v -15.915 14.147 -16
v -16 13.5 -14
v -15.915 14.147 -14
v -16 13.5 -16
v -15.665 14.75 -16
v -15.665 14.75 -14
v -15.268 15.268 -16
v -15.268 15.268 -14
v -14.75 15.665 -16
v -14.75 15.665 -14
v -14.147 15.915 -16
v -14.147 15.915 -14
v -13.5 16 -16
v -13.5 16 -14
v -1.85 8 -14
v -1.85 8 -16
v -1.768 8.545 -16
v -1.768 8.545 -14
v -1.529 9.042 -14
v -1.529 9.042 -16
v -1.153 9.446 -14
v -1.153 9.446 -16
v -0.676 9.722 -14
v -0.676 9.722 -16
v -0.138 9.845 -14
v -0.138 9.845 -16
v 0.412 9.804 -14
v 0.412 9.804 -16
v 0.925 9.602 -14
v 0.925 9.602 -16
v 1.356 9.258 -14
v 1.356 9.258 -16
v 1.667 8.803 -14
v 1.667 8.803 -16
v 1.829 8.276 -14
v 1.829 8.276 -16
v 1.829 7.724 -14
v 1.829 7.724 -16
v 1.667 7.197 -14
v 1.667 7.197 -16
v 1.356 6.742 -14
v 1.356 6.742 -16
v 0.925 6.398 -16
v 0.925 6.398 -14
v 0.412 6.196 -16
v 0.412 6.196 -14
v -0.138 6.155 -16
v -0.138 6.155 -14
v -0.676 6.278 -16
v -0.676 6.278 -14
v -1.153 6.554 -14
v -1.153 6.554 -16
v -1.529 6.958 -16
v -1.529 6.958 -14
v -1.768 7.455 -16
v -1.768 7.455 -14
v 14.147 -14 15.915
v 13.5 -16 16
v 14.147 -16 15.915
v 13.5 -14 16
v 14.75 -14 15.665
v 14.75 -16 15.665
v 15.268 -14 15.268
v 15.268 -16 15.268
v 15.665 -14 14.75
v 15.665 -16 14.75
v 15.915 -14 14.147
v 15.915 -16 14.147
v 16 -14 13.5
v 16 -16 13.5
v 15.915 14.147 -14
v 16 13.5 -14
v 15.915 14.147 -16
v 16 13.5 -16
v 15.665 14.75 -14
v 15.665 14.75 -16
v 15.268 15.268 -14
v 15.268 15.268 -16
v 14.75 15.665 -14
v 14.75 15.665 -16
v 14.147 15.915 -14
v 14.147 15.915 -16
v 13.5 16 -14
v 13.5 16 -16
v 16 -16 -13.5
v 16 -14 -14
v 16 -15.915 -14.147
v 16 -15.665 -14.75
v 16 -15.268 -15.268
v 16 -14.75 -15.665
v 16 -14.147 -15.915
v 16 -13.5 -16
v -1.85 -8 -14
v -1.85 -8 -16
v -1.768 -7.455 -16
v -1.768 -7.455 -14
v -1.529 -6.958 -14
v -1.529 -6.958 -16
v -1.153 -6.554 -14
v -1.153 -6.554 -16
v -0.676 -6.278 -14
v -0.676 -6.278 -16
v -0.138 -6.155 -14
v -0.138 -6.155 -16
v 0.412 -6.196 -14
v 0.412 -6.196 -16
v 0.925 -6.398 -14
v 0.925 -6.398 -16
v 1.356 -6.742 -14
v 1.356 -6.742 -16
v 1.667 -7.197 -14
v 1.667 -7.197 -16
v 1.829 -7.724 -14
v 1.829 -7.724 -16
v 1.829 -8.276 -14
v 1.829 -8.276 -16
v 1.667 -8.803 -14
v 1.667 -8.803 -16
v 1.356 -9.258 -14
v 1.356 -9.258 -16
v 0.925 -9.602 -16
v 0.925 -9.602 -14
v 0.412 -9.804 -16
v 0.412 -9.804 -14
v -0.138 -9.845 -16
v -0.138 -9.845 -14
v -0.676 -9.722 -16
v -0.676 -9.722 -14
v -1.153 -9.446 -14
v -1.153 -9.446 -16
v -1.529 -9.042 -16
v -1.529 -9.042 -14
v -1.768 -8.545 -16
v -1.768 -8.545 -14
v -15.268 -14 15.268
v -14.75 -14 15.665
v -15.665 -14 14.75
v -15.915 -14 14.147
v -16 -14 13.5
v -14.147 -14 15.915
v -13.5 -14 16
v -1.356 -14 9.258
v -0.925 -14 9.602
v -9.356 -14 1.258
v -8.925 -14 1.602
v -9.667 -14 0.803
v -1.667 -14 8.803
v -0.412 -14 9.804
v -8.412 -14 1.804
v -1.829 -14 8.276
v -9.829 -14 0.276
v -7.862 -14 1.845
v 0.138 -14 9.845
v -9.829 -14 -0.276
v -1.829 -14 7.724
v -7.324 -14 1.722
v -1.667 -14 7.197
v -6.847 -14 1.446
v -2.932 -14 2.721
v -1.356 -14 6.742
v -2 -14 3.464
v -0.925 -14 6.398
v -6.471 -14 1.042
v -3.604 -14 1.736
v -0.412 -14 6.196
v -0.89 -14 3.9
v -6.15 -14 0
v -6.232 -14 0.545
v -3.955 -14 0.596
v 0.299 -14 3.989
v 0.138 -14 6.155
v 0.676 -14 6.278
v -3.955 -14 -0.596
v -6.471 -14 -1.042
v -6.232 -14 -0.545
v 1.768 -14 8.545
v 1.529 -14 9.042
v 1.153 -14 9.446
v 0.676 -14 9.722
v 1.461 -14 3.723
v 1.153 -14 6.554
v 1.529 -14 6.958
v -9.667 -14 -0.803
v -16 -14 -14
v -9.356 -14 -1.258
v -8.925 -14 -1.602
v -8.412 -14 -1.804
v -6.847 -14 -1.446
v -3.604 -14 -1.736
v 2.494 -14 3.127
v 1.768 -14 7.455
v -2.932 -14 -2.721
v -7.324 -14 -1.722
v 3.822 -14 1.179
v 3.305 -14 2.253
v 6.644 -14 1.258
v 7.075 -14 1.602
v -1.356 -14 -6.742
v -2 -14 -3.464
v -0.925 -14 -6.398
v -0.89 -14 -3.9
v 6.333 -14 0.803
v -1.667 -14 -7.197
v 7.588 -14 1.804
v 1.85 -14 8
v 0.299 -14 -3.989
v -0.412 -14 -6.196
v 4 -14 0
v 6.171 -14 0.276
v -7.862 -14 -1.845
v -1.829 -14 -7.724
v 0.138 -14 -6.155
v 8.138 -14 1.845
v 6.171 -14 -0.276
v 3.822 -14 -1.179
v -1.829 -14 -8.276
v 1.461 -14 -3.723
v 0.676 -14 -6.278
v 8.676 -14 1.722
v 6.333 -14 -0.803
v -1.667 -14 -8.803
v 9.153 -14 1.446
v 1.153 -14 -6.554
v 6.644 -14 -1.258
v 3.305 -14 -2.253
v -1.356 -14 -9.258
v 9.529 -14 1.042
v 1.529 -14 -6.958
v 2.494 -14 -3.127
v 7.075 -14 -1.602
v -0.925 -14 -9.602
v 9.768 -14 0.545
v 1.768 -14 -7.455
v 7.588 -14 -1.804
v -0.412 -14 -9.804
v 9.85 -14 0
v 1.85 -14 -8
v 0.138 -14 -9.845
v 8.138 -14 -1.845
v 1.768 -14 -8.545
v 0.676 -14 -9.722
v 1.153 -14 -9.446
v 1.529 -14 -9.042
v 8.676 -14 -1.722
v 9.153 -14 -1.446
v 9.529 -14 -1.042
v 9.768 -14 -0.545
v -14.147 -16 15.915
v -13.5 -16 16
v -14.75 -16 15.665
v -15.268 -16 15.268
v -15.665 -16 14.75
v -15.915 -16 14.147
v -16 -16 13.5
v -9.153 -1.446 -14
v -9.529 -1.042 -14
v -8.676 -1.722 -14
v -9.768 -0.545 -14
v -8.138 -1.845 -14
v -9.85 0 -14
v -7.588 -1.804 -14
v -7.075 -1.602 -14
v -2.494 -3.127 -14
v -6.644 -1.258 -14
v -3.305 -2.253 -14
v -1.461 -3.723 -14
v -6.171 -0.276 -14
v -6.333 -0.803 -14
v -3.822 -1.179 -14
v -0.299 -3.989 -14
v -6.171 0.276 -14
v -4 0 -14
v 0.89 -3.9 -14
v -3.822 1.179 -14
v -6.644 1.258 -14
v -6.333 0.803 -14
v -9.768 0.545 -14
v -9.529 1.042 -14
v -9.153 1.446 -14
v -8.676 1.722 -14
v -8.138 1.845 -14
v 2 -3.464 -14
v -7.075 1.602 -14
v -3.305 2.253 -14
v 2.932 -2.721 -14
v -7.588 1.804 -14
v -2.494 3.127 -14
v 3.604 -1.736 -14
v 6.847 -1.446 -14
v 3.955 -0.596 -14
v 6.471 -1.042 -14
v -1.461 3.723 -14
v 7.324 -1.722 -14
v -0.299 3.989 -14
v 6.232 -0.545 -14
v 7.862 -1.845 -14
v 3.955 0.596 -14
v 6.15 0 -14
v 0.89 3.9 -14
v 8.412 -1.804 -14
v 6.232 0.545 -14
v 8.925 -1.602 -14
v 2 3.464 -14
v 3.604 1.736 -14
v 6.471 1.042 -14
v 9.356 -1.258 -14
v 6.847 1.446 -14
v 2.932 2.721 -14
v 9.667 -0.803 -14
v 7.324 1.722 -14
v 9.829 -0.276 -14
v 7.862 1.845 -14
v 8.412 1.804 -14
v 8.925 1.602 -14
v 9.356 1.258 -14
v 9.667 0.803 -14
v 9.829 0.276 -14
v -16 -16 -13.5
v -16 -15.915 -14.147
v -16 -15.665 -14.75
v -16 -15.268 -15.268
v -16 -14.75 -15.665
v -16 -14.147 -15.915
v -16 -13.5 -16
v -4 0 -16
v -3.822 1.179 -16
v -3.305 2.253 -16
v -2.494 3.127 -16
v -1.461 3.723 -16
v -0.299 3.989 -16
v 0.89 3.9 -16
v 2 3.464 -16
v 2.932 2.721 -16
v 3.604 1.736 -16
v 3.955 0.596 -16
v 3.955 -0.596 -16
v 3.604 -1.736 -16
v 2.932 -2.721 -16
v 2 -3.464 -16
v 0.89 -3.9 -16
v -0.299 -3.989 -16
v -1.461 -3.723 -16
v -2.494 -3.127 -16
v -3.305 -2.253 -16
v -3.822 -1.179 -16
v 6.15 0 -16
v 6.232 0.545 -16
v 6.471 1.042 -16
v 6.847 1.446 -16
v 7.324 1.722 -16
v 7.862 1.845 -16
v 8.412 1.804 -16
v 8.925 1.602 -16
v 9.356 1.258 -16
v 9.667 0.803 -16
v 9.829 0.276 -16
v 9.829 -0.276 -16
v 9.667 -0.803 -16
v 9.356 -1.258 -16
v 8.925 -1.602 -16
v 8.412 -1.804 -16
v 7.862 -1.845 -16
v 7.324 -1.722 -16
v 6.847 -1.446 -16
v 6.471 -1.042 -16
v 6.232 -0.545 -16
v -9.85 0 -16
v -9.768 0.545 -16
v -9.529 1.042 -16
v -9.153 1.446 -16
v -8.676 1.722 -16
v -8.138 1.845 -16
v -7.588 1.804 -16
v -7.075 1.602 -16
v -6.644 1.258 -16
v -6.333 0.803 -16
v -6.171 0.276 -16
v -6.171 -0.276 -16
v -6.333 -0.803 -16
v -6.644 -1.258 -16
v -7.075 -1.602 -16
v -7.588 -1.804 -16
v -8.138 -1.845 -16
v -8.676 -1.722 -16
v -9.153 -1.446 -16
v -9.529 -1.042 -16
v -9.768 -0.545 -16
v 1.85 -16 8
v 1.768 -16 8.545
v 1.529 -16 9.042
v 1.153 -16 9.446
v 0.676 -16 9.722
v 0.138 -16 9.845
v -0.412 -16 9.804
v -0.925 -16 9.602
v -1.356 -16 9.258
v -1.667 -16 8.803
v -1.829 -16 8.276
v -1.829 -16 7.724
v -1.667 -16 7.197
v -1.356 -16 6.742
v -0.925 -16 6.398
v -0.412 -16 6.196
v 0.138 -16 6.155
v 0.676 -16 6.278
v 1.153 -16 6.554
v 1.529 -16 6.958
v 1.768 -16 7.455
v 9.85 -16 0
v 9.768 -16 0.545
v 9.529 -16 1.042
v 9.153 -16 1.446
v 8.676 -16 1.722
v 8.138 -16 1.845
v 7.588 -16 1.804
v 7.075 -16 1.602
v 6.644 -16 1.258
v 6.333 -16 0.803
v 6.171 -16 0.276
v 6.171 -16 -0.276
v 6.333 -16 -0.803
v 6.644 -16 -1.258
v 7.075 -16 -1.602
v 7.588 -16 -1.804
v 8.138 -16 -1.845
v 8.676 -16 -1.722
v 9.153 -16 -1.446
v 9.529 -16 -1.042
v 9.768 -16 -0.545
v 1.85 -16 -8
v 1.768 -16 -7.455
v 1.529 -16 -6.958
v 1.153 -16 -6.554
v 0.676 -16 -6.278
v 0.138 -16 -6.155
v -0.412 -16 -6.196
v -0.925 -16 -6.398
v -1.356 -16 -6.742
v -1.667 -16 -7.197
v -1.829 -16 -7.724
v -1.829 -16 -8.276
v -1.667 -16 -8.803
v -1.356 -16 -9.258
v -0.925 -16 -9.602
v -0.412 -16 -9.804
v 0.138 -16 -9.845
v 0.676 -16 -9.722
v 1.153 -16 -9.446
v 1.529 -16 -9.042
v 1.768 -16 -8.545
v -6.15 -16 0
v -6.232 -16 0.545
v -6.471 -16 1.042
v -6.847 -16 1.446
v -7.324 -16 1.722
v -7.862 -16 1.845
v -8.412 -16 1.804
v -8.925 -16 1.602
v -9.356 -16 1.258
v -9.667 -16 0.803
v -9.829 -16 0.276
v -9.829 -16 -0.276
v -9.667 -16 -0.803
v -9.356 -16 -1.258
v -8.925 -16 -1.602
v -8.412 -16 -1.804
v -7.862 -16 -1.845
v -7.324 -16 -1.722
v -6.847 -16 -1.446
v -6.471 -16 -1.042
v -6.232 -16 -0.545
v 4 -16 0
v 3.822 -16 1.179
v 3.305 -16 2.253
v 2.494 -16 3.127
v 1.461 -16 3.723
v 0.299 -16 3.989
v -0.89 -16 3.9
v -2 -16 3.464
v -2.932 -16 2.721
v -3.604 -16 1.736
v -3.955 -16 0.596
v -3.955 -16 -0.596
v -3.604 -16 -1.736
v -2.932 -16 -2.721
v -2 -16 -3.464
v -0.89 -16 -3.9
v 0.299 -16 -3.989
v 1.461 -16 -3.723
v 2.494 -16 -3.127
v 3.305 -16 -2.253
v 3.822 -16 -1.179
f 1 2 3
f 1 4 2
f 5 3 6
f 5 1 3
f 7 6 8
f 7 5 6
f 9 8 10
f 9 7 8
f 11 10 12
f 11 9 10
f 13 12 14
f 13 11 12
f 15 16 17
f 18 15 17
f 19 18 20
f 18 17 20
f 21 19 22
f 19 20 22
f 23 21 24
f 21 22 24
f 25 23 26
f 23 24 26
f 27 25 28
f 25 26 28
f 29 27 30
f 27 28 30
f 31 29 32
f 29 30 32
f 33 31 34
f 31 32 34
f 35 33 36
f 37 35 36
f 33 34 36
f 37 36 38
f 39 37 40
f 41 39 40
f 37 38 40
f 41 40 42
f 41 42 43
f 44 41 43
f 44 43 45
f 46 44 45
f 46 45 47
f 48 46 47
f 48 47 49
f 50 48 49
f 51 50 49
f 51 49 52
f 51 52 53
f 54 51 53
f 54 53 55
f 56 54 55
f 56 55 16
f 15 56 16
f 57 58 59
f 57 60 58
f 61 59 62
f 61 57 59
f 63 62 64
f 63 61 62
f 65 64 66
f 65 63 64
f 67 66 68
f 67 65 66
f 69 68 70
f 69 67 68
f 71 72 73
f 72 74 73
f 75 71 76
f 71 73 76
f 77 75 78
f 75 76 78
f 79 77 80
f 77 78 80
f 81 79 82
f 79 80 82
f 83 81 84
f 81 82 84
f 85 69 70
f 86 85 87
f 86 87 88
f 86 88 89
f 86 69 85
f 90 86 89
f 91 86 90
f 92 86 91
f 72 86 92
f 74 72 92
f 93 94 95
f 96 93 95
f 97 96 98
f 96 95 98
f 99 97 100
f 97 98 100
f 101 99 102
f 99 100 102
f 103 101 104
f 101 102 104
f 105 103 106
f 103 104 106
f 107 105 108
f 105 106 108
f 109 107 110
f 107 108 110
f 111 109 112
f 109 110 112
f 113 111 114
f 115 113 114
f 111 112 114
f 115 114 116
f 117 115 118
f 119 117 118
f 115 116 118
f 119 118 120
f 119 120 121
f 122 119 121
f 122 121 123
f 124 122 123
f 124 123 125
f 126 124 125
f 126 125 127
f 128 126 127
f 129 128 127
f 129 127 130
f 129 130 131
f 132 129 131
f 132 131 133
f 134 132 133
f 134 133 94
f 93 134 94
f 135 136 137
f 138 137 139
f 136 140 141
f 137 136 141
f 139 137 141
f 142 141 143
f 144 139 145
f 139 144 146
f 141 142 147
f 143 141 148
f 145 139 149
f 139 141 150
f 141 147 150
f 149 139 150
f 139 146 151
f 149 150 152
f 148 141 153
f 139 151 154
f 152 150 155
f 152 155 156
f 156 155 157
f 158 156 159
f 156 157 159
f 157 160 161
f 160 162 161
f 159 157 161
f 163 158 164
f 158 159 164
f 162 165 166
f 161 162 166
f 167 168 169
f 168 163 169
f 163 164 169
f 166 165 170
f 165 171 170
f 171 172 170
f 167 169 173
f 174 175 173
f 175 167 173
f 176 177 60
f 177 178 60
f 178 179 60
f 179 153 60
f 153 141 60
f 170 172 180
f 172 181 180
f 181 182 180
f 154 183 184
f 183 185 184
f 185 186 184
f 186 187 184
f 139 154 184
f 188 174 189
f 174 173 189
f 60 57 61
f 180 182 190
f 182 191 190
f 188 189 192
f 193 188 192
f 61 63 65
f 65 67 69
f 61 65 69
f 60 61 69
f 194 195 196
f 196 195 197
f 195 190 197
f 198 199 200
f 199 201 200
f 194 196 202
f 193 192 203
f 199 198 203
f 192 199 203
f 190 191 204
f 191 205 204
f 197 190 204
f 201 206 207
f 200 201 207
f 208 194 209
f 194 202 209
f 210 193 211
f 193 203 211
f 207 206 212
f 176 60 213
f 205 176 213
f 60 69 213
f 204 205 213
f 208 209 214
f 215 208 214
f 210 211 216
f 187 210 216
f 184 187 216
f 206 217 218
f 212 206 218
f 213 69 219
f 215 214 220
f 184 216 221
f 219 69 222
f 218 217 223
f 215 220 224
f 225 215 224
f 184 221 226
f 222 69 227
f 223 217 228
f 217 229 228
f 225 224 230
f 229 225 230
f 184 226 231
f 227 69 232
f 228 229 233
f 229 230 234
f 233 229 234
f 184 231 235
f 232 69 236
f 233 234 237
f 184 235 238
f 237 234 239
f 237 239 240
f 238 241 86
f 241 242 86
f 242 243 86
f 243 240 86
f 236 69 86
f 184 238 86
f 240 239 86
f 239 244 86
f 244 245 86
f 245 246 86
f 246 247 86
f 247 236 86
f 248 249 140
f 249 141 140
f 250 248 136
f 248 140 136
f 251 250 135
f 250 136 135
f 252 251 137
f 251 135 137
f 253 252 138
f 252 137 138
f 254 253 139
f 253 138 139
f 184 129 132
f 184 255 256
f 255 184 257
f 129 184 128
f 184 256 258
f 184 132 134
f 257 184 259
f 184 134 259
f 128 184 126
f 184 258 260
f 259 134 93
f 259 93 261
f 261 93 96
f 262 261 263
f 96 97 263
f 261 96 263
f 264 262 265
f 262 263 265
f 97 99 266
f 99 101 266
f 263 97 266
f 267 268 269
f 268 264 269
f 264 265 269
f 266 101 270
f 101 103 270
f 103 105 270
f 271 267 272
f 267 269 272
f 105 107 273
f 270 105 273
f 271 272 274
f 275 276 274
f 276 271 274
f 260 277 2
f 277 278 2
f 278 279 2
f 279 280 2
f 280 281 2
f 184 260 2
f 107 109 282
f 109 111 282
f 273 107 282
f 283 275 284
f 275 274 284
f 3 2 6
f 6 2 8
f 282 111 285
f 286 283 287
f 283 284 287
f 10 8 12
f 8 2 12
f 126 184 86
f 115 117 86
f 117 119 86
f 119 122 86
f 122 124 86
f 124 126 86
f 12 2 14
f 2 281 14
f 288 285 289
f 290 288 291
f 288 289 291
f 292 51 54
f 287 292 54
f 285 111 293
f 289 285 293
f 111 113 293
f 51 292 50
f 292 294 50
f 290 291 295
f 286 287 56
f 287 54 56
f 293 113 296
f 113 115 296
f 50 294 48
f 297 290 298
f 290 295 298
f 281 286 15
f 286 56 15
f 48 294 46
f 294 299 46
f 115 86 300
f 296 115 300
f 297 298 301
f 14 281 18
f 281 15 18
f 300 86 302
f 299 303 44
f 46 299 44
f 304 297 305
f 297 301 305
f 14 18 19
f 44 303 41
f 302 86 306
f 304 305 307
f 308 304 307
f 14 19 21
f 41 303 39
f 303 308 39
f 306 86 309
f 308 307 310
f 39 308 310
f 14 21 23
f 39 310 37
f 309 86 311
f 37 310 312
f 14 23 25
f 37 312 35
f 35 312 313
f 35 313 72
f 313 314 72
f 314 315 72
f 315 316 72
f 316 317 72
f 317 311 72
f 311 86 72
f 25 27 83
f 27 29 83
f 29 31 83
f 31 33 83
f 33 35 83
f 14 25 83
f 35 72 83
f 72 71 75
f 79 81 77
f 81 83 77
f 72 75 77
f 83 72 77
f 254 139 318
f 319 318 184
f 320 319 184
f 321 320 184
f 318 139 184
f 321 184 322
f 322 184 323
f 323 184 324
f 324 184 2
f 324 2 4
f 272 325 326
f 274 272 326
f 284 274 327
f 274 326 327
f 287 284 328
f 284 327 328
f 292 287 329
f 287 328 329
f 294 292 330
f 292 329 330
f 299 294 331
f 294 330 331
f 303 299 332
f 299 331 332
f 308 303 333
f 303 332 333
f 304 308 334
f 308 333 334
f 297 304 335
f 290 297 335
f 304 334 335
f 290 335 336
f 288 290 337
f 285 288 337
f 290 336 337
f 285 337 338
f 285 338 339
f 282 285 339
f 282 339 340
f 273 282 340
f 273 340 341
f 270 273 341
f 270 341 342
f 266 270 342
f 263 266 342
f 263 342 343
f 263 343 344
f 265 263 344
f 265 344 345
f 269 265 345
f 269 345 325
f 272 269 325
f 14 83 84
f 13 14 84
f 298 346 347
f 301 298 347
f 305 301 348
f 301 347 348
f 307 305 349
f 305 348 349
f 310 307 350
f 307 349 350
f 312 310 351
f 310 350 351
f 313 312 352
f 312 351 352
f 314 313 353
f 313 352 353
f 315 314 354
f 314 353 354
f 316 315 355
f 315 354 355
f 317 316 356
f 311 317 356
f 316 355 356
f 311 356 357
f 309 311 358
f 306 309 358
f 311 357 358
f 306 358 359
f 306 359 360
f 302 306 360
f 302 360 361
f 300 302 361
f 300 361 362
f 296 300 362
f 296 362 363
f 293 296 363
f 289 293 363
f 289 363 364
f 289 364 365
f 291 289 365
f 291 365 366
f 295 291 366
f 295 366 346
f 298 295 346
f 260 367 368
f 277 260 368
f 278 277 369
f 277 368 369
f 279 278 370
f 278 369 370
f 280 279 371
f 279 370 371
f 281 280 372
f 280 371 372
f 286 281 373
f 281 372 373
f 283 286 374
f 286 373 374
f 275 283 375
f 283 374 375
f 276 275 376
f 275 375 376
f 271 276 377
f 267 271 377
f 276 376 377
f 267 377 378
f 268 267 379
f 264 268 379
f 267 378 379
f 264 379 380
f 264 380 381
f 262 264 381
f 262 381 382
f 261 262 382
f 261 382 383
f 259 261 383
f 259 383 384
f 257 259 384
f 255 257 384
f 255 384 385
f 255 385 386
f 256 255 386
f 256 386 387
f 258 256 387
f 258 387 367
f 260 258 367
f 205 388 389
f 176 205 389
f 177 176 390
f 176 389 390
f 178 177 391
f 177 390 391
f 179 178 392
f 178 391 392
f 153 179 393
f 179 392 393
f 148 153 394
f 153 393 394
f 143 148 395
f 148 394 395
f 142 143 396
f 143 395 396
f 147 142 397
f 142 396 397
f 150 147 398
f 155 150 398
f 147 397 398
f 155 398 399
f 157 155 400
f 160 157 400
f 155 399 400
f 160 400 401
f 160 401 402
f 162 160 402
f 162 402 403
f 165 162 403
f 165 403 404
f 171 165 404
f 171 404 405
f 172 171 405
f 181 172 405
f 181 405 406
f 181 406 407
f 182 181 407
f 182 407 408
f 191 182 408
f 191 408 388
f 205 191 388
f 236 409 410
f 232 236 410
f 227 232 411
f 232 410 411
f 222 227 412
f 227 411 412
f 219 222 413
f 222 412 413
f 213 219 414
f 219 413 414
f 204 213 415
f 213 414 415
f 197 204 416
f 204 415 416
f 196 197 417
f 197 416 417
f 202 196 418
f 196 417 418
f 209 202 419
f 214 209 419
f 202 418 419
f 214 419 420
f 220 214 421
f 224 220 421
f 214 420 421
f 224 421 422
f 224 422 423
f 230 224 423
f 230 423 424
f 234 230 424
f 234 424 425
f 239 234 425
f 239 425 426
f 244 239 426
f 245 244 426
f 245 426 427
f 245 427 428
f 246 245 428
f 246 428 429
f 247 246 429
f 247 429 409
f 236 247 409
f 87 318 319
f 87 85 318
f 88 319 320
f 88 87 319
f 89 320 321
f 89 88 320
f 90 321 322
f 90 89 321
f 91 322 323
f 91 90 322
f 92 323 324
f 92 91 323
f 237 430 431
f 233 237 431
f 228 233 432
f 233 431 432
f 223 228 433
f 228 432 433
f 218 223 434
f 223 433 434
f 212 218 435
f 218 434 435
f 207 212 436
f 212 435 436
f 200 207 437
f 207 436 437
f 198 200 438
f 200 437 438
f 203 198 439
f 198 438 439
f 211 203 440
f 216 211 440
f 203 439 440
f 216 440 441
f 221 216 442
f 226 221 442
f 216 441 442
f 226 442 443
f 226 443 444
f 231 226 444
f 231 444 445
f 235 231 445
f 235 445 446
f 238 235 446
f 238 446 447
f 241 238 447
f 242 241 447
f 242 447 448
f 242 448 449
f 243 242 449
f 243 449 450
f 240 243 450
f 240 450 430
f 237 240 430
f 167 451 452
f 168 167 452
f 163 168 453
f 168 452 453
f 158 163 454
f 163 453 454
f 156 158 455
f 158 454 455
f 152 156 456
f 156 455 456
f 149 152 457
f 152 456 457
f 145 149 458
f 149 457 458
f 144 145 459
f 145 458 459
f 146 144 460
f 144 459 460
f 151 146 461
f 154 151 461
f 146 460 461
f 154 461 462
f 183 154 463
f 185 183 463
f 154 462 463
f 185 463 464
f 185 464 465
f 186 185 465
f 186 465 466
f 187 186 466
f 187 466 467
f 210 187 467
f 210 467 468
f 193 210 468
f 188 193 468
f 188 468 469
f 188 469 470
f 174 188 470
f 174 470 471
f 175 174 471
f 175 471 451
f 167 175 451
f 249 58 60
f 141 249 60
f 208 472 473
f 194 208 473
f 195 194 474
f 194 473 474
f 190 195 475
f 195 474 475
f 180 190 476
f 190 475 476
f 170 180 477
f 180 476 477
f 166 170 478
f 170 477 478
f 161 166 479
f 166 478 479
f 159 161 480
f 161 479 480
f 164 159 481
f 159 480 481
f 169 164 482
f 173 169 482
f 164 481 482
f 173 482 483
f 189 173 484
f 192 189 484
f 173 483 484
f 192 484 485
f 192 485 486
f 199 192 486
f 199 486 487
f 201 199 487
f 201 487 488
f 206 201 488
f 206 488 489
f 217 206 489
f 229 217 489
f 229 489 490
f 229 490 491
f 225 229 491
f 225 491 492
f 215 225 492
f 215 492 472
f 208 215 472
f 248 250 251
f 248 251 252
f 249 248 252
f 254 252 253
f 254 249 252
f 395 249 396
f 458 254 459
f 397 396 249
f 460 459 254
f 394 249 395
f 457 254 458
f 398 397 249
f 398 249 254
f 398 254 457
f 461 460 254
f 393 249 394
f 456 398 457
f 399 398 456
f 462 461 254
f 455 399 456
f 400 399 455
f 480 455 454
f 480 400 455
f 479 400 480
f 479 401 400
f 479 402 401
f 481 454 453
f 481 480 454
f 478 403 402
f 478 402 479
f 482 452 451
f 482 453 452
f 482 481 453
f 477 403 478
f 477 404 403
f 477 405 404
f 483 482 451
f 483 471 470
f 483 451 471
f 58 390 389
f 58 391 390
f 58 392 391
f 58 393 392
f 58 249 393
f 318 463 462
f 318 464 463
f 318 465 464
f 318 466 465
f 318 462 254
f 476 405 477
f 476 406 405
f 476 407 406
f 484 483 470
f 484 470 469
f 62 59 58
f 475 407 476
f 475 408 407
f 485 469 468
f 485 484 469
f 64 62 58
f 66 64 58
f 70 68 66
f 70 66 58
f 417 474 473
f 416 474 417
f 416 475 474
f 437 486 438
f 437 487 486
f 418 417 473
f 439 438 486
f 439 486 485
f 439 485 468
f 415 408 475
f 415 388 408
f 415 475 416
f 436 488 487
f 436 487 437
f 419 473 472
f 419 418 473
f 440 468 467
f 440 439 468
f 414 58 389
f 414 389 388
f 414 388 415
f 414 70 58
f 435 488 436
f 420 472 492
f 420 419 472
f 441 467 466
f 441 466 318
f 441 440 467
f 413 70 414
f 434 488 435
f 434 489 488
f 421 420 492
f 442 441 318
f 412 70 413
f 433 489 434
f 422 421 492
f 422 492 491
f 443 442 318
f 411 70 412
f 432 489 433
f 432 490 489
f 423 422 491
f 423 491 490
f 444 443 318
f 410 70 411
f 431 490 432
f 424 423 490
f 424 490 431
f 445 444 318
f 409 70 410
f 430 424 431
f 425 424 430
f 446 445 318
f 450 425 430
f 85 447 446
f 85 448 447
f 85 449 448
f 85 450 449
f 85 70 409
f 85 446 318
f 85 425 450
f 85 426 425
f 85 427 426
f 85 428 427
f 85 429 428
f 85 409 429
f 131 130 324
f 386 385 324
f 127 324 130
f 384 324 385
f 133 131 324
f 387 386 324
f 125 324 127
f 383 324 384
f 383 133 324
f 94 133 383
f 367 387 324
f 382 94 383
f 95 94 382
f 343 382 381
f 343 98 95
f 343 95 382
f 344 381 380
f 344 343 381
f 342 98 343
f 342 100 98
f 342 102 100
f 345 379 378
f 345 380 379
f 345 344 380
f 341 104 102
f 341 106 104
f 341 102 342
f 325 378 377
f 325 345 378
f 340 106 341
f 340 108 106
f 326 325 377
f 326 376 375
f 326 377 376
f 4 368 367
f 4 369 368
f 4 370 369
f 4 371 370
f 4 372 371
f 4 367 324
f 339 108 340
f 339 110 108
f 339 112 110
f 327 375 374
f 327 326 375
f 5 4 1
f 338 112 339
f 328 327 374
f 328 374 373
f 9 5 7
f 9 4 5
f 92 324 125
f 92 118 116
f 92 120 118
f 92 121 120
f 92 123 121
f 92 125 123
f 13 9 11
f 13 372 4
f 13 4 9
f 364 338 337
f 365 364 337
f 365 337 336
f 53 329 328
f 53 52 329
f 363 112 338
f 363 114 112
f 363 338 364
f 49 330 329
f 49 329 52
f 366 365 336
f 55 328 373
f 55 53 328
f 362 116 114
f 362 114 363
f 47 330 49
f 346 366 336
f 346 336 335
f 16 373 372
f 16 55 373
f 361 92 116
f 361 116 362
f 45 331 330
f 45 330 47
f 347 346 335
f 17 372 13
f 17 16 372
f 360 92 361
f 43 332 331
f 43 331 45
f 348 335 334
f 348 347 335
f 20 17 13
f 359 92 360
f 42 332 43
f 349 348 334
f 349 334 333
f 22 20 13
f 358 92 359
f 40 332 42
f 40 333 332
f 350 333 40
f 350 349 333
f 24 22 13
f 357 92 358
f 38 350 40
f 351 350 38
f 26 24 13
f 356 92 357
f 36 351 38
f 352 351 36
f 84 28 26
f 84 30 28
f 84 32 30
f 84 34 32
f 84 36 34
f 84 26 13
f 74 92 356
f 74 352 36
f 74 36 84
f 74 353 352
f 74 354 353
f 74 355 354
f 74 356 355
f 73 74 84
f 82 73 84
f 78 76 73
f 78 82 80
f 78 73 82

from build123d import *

# Parameters (mm, degrees)
SKETCH1_W           = 32
SKETCH1_H           = 32
BOSS_EXTRUDE1_DEPTH = 16
SKETCH2_W           = 30
SKETCH2_H           = 30
CUT_EXTRUDE1_DEPTH  = 32
SKETCH3_R           = 4
SKETCH3_R_2         = 1.85
CUT_EXTRUDE2_DEPTH  = 33
SKETCH4_R           = 4
SKETCH4_R_2         = 1.85
CUT_EXTRUDE3_DEPTH  = 33
FILLET1_R           = 2.5


with BuildPart() as part:
    # Sketch1 → Boss-Extrude1 (new body, symmetric)
    with BuildSketch(Plane(origin=(0, 0, 0), x_dir=(0, 0, -1), z_dir=(1, 0, 0))):
        Rectangle(SKETCH1_W, SKETCH1_H)
    extrude(amount=BOSS_EXTRUDE1_DEPTH, both=True)

    # Sketch2 → Cut-Extrude1 (cut)
    with BuildSketch(Plane(origin=(16, 0, 0), x_dir=(0, 0, -1), z_dir=(1, 0, 0))):
        with Locations((-1, 1)):
            Rectangle(SKETCH2_W, SKETCH2_H)
    extrude(amount=-CUT_EXTRUDE1_DEPTH, mode=Mode.SUBTRACT)

    # Sketch3 → Cut-Extrude2 (cut, through all)
    with BuildSketch(Plane(origin=(0, 0, -16), x_dir=(-1, 0, 0), z_dir=(0, 0, -1))):
        Circle(SKETCH3_R)
        with Locations((8, 0)):
            Circle(SKETCH3_R_2)
        with Locations((-8, 0)):
            Circle(SKETCH3_R_2)
        with Locations((0, 8)):
            Circle(SKETCH3_R_2)
        with Locations((0, -8)):
            Circle(SKETCH3_R_2)
    extrude(amount=-CUT_EXTRUDE2_DEPTH, mode=Mode.SUBTRACT)

    # Sketch4 → Cut-Extrude3 (cut, through all)
    with BuildSketch(Plane.XZ.offset(16)):
        Circle(SKETCH4_R)
        with Locations((8, 0)):
            Circle(SKETCH4_R_2)
        with Locations((-8, 0)):
            Circle(SKETCH4_R_2)
        with Locations((0, 8)):
            Circle(SKETCH4_R_2)
        with Locations((0, -8)):
            Circle(SKETCH4_R_2)
    extrude(amount=-CUT_EXTRUDE3_DEPTH, mode=Mode.SUBTRACT)

    # Fillet1
    fillet1_edges = [part.edges().sort_by_distance(p)[0] for p in [
        (-16, -15, 16),
        (16, -15, 16),
        (-16, 16, -15),
        (16, 16, -15),
        (0, -16, -16),
    ]]
    fillet(fillet1_edges, radius=FILLET1_R)


solid = part.part
